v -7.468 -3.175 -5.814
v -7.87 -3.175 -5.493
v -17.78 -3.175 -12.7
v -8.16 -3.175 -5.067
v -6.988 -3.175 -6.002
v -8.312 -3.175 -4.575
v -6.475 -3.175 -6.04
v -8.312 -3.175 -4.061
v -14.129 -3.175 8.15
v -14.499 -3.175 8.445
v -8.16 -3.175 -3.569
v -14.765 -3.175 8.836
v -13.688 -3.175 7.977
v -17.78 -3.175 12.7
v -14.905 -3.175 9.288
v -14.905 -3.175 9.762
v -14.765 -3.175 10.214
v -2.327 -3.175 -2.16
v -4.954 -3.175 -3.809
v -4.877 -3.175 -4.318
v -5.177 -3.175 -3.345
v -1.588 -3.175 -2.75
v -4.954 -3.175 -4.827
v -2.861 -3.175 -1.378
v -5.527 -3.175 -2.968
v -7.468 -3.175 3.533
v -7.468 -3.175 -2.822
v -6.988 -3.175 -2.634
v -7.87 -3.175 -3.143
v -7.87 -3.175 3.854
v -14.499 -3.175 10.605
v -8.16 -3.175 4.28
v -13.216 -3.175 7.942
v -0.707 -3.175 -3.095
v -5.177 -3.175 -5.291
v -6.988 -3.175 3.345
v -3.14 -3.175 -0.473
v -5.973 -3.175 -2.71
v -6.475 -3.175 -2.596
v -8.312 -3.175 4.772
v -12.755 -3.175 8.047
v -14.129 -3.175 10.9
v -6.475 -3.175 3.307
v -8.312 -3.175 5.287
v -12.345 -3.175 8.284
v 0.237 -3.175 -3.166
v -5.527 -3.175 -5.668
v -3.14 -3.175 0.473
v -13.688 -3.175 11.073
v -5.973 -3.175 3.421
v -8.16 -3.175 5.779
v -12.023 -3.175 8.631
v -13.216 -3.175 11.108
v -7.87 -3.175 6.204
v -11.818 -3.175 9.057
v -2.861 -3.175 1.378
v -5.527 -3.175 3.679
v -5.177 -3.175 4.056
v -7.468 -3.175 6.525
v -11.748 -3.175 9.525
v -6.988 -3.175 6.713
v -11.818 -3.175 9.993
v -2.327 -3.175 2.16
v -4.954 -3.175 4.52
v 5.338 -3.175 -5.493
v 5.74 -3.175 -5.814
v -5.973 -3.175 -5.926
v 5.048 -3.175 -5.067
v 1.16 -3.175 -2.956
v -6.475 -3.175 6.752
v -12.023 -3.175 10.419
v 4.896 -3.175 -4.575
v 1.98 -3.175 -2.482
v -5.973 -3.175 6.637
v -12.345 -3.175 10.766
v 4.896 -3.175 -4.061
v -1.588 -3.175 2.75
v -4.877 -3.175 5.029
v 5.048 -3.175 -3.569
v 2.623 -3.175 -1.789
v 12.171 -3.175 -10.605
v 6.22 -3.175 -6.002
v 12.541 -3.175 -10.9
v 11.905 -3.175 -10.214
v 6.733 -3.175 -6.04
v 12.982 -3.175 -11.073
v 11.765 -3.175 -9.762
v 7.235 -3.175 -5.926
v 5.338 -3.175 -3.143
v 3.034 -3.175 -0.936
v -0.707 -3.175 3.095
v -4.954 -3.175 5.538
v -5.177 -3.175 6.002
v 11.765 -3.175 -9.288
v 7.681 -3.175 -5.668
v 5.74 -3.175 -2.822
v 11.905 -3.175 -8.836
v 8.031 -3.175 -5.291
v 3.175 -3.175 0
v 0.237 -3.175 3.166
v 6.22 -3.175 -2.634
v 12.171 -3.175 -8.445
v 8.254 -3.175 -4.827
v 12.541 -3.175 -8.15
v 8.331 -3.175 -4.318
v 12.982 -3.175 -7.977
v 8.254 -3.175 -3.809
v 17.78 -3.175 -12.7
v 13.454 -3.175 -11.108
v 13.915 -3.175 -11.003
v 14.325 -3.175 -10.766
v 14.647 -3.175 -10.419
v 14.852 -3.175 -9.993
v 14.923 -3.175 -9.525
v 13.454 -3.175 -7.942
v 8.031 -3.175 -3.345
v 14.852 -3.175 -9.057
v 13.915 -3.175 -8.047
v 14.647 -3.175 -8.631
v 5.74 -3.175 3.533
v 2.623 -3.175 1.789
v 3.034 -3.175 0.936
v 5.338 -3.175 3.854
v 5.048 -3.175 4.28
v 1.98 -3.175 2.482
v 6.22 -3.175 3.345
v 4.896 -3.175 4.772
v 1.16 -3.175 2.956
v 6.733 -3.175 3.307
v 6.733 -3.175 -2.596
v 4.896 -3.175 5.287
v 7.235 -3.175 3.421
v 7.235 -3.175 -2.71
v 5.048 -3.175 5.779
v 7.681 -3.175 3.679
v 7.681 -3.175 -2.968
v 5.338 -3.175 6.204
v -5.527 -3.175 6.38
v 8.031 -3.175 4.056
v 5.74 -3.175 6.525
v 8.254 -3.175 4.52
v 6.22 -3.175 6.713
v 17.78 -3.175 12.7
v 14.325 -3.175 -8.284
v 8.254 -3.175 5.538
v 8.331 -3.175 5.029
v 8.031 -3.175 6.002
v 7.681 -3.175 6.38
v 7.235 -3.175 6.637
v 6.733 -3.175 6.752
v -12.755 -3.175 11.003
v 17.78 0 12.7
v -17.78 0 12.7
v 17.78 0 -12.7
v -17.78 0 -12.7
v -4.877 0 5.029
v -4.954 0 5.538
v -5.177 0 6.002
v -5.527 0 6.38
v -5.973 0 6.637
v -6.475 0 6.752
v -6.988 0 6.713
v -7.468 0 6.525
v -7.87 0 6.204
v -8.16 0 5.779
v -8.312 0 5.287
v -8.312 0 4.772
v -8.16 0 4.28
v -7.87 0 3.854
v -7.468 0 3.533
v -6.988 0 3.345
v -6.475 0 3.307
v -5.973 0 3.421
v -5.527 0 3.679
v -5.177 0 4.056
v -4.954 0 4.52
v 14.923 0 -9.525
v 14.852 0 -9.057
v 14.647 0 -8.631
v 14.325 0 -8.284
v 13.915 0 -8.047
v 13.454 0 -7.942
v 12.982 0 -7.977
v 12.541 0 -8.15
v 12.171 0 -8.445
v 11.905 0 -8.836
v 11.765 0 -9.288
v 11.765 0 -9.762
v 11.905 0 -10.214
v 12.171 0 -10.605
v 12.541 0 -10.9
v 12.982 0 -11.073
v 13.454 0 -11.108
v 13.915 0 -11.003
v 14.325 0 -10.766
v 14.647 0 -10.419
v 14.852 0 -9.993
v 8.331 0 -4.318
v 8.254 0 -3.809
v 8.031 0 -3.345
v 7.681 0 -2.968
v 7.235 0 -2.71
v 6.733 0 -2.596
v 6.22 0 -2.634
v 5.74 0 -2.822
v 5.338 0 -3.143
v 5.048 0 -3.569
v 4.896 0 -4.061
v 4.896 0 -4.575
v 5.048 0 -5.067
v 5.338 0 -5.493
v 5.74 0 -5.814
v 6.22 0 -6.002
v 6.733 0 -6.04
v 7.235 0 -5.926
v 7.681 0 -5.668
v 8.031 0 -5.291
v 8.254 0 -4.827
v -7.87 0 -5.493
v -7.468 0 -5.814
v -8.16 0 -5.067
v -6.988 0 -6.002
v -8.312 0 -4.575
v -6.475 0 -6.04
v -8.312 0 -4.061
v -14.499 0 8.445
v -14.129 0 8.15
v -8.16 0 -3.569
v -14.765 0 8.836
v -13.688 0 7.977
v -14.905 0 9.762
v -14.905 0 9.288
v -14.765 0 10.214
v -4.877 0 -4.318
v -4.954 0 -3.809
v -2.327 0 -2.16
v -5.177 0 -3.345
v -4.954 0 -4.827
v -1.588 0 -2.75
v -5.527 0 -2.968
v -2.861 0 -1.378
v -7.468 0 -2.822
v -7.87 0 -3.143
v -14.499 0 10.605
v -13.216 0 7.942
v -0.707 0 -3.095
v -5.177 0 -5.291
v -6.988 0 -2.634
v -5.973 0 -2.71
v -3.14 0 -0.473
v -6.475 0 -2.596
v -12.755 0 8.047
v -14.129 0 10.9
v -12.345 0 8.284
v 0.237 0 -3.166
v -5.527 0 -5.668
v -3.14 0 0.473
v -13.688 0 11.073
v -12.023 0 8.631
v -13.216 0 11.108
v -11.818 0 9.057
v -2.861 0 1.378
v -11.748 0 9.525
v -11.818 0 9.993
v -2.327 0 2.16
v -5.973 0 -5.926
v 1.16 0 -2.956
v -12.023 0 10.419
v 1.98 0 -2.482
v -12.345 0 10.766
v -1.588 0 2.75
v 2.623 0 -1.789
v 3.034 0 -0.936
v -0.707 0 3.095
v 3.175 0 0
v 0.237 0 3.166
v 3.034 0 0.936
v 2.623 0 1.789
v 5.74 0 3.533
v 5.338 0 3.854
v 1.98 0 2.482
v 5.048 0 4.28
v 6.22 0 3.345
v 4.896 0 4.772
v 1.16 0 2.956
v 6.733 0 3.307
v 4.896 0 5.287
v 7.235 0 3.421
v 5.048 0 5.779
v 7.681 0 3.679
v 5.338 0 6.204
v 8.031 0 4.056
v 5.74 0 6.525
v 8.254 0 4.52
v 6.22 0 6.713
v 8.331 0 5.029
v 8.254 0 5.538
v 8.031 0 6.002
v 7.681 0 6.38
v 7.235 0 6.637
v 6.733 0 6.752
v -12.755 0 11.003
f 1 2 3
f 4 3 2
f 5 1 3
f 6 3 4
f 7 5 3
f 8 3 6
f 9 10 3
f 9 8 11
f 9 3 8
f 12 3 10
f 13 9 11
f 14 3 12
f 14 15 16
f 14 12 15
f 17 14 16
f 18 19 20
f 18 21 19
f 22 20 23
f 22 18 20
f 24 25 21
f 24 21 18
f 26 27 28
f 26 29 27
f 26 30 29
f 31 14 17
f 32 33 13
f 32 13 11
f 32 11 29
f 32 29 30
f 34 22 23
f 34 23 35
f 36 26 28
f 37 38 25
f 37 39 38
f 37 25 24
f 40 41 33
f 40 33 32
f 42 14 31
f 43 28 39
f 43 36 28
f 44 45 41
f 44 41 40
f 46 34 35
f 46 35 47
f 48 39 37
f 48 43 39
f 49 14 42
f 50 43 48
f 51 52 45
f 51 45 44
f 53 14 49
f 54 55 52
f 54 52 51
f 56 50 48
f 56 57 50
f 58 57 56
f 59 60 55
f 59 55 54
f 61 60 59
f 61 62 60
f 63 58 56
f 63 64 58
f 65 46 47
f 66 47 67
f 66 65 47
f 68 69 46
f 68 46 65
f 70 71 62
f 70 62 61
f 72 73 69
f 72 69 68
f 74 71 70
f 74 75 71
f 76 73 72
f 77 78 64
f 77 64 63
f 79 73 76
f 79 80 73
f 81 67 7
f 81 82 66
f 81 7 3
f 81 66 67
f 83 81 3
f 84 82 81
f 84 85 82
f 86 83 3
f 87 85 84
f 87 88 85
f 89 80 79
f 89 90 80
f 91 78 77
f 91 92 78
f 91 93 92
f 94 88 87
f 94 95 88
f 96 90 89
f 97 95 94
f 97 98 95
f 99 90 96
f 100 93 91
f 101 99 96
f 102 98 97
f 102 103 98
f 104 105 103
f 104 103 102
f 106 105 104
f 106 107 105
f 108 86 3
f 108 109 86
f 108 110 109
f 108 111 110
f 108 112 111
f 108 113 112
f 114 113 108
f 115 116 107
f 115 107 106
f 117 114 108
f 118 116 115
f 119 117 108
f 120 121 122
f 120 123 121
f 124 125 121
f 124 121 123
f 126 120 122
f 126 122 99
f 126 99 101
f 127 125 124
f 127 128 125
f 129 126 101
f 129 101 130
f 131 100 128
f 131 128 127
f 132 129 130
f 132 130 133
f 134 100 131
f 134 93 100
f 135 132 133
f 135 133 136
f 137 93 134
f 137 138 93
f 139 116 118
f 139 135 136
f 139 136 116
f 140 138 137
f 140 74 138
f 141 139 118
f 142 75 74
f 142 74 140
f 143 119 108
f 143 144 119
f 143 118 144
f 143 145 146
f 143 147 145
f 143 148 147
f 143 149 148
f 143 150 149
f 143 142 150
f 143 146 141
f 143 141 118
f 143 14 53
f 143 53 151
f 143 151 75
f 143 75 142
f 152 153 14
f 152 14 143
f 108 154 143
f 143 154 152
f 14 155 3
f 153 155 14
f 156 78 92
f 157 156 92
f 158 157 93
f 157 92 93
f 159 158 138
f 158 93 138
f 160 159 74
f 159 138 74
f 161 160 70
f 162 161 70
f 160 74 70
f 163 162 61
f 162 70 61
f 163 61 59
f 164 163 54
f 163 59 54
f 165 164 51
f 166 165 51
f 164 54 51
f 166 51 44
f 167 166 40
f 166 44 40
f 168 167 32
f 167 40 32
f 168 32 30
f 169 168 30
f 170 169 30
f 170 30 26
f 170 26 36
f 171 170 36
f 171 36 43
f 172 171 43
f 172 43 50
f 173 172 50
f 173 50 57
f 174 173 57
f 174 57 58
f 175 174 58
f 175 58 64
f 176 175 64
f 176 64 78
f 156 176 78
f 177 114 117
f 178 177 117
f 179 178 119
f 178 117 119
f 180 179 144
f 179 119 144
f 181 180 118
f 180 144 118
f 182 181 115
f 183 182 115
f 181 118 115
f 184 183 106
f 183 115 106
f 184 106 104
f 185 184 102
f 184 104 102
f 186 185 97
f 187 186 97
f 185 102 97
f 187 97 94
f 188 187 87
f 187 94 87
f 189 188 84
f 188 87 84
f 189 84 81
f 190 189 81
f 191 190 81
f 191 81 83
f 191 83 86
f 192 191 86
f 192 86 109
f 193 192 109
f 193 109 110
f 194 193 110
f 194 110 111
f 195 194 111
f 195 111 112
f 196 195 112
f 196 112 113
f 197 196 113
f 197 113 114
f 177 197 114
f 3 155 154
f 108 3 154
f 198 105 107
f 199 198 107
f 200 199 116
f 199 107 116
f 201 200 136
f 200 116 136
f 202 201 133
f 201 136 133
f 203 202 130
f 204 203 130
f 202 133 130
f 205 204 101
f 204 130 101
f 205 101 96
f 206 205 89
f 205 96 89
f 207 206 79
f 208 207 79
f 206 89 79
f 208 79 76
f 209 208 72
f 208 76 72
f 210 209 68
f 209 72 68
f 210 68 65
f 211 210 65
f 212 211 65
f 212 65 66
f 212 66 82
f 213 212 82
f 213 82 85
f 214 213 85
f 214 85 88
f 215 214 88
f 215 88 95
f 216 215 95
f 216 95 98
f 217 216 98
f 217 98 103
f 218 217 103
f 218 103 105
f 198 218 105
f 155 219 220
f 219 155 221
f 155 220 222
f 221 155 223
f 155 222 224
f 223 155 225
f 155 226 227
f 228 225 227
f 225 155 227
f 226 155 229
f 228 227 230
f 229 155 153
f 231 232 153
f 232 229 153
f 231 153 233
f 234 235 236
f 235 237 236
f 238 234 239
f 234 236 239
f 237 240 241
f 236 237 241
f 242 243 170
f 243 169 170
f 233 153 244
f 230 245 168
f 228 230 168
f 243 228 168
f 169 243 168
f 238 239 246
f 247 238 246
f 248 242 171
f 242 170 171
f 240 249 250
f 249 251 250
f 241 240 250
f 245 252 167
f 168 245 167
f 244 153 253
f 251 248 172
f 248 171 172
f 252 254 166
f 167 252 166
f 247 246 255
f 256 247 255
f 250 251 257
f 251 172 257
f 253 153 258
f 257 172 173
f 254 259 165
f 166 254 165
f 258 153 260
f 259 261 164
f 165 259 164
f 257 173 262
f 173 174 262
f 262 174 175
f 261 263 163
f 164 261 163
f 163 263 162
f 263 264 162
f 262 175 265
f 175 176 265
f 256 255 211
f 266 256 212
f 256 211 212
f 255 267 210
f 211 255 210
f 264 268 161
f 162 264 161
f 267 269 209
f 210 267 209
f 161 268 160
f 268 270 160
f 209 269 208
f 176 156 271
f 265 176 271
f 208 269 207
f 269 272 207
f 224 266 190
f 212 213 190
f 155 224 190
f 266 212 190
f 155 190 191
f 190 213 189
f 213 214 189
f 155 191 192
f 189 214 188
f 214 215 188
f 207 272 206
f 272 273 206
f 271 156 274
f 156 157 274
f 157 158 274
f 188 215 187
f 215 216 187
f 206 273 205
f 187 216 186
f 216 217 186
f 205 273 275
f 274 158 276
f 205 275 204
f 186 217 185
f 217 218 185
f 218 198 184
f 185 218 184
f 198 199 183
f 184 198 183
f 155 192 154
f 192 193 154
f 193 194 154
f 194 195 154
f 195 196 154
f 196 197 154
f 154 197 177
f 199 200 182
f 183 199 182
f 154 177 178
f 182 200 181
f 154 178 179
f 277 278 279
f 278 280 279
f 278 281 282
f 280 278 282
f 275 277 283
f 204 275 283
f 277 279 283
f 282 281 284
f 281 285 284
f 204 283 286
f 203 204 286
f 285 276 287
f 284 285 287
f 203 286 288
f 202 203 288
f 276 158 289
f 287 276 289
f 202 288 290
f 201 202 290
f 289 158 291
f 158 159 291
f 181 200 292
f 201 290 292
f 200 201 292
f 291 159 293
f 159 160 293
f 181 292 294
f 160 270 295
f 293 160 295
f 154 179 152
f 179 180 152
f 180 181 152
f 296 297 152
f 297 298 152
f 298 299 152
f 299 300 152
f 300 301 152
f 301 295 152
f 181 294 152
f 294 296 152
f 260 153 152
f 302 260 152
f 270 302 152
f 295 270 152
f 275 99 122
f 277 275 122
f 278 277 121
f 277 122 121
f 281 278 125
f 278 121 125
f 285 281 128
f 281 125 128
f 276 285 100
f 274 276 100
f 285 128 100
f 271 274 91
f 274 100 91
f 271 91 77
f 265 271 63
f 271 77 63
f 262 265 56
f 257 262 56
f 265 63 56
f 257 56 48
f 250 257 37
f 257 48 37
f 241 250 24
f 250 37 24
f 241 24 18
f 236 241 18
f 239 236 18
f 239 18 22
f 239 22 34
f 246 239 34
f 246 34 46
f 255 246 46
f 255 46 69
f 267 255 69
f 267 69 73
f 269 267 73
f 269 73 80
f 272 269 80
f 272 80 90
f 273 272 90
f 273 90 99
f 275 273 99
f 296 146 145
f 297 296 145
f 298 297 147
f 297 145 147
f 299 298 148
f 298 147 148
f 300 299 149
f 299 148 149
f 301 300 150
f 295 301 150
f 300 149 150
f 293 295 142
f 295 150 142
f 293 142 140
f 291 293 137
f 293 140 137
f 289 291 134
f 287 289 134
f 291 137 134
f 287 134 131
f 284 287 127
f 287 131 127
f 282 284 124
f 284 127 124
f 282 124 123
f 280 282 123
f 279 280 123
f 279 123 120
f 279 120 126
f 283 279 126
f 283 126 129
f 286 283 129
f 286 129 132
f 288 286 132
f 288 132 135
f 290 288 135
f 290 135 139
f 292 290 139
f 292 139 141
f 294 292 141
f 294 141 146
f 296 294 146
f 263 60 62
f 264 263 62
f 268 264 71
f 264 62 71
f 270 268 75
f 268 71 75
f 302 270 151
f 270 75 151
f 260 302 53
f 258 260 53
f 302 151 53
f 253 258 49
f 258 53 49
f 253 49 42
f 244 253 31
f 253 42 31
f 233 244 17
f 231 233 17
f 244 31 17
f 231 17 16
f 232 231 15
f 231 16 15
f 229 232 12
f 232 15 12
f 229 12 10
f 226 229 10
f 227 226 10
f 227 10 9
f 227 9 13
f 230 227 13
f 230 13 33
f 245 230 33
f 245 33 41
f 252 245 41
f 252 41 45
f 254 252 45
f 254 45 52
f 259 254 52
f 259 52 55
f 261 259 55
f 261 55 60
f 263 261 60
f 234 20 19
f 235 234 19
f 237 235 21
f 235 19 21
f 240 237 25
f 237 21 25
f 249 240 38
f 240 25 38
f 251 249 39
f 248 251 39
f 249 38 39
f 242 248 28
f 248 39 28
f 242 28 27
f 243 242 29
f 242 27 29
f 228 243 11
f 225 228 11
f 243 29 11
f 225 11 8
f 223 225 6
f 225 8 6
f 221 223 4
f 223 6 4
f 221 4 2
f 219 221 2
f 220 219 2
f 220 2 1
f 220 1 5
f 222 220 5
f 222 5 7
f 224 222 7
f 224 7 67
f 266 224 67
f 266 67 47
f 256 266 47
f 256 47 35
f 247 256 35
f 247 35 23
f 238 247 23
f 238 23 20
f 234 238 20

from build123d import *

# Parameters (mm, degrees)
F0_W     = 35.56
F0_H     = 25.4
F1_DEPTH = 3.175
F2_R     = 3.175
F2_R_2   = 1.7272
F3_DEPTH = 3.176
F4_R     = 1.5875
F5_DEPTH = 3.176


with BuildPart() as f1:
    # F0 (on Front) → F1 (new body)
    with BuildSketch(Plane.XZ):
        Rectangle(F0_W, F0_H)
    extrude(amount=F1_DEPTH)

    # F2 (on face) → F3 (cut, through all)
    with BuildSketch(Plane.XZ.offset(3.175)):
        Circle(F2_R)
        with Locations((6.604, 5.0292)):
            Circle(F2_R_2)
        with Locations((6.604, -4.318)):
            Circle(F2_R_2)
        with Locations((-6.604, -4.318)):
            Circle(F2_R_2)
        with Locations((-6.604, 5.0292)):
            Circle(F2_R_2)
    extrude(amount=-F3_DEPTH, mode=Mode.SUBTRACT)

    # F4 (on face) → F5 (cut, through all)
    with BuildSketch(Plane.XZ.offset(3.175)):
        with Locations((-13.335, 9.525)):
            Circle(F4_R)
        with Locations((13.335, -9.525)):
            Circle(F4_R)
    extrude(amount=-F5_DEPTH, mode=Mode.SUBTRACT)


solid = f1.part
